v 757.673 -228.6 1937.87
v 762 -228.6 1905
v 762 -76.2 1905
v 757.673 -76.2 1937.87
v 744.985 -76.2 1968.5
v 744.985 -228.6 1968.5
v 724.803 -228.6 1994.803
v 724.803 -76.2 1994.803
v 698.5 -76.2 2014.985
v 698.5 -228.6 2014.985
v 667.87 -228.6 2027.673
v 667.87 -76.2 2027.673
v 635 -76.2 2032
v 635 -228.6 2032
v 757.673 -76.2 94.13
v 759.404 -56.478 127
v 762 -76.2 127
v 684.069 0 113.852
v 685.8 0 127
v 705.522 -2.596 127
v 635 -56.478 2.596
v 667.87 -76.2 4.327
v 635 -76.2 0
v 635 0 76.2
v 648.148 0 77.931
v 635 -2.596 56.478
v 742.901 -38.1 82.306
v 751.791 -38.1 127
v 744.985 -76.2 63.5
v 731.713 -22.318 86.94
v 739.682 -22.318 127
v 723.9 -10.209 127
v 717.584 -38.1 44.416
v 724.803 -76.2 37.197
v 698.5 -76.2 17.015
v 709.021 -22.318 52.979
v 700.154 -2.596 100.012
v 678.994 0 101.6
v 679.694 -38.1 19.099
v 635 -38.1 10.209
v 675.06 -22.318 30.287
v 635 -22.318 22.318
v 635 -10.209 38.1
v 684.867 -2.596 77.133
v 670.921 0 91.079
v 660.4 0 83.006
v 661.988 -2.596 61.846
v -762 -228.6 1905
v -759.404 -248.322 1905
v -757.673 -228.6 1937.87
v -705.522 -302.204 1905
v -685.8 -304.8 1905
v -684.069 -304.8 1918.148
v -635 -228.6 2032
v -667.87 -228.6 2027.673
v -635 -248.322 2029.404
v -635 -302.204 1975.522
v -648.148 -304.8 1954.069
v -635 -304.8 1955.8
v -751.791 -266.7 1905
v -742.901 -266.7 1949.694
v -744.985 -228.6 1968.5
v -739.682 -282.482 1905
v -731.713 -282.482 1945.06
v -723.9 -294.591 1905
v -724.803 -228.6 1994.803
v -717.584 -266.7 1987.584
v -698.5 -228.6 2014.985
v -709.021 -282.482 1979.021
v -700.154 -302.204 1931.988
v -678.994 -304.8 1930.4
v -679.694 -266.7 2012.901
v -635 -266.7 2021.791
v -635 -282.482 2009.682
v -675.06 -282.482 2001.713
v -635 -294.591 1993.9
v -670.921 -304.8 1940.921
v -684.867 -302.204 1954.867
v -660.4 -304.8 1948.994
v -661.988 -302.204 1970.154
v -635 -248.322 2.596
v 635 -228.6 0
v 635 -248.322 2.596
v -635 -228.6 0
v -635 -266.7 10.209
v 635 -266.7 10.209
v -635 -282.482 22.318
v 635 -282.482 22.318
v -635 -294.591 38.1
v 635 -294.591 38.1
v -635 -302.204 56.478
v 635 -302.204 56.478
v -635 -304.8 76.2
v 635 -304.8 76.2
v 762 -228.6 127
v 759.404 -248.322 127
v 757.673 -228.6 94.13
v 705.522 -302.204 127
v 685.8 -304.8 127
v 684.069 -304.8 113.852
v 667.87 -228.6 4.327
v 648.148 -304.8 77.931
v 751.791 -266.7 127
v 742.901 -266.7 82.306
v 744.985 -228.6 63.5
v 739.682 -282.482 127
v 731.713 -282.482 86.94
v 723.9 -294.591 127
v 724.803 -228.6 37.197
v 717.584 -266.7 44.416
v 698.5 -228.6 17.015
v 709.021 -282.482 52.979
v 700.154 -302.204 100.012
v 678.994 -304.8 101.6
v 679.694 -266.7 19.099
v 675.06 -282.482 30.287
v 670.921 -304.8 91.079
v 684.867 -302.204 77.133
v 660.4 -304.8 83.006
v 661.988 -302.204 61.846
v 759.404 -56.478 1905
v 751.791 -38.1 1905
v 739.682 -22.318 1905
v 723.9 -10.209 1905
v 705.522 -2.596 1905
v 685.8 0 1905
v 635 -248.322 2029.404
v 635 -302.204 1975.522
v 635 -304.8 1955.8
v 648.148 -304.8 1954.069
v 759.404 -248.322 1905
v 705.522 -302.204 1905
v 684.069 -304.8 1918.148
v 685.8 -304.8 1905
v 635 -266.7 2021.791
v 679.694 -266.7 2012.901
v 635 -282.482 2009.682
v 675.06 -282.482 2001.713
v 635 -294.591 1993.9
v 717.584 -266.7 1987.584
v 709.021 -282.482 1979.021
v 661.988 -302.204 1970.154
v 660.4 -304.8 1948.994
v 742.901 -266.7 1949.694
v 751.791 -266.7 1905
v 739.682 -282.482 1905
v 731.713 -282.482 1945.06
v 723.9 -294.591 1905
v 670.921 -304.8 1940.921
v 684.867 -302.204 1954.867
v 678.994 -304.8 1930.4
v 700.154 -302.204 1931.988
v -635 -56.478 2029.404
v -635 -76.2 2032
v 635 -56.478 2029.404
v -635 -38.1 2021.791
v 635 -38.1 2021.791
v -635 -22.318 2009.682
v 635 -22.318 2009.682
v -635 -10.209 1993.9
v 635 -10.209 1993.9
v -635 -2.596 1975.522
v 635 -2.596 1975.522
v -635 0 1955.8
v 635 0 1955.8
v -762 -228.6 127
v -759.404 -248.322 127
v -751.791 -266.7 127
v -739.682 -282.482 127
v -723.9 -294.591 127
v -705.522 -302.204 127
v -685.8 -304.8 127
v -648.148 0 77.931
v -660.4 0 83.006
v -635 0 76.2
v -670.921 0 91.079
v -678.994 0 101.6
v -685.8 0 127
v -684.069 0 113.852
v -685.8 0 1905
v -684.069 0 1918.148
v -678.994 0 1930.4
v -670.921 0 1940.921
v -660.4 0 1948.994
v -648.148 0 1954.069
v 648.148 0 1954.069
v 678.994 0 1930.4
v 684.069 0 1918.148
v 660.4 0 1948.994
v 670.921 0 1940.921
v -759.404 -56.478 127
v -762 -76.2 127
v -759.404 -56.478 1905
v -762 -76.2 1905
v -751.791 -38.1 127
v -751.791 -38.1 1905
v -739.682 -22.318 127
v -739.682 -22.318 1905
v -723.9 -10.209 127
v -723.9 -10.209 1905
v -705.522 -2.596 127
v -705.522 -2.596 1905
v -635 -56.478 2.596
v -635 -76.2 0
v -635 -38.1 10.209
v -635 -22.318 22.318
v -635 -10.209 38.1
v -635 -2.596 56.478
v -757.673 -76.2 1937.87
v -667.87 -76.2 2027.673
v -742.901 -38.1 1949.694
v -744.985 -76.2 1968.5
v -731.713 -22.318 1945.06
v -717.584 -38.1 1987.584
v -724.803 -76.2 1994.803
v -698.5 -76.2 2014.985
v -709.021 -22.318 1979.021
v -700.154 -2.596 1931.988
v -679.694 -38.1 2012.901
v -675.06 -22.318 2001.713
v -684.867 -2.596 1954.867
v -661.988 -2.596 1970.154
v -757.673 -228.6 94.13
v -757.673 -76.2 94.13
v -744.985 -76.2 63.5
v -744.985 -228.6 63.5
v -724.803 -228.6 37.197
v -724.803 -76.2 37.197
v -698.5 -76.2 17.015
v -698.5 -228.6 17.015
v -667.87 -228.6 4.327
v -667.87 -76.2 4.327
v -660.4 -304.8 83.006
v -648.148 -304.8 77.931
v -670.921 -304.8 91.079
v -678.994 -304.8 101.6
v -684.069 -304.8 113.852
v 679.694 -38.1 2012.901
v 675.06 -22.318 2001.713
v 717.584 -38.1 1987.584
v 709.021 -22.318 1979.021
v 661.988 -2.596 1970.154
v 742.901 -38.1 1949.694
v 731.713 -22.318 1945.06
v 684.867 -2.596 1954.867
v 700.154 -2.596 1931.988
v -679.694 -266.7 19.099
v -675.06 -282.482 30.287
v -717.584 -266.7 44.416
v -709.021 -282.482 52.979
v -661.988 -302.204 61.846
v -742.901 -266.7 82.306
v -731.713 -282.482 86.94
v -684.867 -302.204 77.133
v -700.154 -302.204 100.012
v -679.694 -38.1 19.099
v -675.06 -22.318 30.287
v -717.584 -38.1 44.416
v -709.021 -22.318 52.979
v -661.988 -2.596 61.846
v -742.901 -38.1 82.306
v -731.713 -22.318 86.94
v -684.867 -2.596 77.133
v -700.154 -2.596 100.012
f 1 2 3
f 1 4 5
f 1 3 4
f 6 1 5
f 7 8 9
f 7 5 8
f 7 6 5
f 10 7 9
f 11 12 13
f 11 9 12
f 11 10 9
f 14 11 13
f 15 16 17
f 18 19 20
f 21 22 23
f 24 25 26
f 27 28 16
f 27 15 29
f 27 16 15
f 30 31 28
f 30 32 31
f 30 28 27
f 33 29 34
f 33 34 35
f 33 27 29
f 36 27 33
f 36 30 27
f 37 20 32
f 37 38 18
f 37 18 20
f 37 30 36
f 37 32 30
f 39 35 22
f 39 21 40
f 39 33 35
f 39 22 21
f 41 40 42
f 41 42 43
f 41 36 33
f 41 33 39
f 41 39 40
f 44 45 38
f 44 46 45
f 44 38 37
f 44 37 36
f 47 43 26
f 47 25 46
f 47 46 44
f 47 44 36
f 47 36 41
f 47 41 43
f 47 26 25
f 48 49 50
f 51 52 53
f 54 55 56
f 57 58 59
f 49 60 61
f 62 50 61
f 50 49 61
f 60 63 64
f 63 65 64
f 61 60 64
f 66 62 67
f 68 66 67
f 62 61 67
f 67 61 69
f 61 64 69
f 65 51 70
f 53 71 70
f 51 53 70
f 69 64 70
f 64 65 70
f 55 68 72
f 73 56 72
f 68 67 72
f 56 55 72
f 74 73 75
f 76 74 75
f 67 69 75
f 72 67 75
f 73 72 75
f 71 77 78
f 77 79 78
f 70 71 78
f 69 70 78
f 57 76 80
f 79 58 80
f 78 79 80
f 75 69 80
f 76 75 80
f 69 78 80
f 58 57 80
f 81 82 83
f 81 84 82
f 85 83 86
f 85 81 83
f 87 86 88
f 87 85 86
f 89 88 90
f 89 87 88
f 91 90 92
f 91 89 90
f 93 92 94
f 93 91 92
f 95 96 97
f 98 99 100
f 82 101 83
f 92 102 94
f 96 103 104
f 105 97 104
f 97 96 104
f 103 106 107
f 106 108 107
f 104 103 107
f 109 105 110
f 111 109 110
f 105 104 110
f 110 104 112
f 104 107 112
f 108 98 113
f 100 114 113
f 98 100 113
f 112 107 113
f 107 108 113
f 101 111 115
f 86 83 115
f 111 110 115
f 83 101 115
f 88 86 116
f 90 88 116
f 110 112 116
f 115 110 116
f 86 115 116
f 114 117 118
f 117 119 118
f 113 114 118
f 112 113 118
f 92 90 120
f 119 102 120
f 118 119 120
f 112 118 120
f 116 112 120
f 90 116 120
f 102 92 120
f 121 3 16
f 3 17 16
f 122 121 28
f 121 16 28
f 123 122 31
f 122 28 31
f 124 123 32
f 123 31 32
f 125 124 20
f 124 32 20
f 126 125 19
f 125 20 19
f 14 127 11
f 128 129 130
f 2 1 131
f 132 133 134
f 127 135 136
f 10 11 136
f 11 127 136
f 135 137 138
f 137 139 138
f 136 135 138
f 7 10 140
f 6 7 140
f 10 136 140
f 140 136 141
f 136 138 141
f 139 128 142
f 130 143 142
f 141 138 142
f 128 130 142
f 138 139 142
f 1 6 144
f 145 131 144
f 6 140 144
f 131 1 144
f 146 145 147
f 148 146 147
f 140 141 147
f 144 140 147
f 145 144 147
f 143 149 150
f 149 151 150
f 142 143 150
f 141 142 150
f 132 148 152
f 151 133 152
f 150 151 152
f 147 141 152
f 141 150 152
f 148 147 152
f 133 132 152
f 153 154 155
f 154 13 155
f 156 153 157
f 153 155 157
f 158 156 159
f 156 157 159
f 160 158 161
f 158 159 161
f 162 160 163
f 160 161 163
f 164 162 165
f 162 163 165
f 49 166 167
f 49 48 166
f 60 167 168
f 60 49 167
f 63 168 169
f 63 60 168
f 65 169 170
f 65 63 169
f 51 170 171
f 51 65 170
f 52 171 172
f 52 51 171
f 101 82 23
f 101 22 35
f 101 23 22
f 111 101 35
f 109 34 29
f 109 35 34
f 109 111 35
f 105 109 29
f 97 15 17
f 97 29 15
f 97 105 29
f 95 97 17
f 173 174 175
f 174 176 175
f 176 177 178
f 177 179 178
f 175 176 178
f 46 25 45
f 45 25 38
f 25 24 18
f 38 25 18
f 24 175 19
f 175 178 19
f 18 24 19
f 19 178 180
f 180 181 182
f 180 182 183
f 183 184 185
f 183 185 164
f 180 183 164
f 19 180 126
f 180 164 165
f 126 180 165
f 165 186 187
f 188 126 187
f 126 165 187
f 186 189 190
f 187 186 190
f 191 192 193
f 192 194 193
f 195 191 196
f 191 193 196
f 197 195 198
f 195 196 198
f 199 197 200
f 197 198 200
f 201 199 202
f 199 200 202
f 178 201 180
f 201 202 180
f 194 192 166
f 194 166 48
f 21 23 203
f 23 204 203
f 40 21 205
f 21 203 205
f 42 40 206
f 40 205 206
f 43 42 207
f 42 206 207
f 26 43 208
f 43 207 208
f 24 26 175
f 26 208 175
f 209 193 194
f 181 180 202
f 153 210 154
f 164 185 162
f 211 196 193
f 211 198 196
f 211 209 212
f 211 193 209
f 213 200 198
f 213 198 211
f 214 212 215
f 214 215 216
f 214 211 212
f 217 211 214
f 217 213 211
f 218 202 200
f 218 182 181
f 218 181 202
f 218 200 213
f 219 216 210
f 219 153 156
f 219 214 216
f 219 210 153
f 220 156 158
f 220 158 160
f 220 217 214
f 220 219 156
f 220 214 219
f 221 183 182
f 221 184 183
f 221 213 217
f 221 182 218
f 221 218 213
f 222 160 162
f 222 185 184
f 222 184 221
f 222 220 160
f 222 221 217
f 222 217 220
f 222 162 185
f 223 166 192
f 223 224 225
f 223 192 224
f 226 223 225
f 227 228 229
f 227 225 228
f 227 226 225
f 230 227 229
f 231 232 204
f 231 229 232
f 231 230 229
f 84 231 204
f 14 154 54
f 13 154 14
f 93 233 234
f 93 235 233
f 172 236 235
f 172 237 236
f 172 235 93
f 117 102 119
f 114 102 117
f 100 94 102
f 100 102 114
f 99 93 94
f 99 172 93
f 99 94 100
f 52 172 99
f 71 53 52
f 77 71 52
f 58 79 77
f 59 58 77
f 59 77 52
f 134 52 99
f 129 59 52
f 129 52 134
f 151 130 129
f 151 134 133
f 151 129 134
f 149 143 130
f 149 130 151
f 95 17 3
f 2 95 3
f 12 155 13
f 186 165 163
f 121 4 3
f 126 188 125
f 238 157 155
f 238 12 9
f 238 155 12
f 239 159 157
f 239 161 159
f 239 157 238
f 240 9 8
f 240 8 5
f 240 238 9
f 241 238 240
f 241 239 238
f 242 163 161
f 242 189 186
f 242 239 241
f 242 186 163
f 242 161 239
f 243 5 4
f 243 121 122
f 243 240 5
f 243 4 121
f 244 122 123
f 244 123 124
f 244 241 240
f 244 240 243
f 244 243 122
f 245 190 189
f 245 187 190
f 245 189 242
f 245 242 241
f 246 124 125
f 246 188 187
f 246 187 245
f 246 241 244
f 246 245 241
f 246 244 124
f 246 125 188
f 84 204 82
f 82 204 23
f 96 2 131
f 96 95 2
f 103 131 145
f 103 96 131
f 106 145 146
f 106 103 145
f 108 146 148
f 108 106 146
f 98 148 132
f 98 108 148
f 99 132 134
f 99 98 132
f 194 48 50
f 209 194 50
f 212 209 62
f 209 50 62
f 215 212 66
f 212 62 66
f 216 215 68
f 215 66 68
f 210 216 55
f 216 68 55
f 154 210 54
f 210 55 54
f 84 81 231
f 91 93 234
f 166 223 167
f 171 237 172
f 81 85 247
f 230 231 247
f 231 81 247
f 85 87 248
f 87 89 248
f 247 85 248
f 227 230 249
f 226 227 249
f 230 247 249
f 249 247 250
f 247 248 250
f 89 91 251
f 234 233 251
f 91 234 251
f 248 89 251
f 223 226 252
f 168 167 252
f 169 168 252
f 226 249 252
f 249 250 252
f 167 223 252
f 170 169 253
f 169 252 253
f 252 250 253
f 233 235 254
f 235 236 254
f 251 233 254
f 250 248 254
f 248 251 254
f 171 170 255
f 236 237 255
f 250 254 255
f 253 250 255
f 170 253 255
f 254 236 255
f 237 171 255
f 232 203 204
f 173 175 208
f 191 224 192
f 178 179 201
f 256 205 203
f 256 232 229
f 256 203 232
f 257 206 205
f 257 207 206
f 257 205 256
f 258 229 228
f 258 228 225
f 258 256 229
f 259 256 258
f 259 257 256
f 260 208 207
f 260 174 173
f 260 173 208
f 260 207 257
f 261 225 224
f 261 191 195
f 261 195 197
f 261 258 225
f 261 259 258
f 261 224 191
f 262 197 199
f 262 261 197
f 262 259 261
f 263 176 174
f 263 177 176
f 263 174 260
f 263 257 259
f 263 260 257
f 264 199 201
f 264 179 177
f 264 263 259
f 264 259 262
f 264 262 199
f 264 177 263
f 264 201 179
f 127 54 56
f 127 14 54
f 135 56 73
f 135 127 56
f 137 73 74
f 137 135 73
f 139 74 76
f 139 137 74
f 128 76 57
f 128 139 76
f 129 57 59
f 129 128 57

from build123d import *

# Parameters (mm, degrees)
F0_W     = 1524
F0_H     = 2032
F1_DEPTH = 304.8
F2_R     = 127
F3_R     = 76.2


with BuildPart() as f1:
    # F0 (on Front) → F1 (new body)
    with BuildSketch(Plane.XZ):
        with Locations((0, 1016)):
            Rectangle(F0_W, F0_H)
    extrude(amount=F1_DEPTH)

    # F2
    f2_edges = [f1.edges().sort_by_distance(p)[0] for p in [
        (762, -152.4, 2032),
        (-762, -152.4, 2032),
        (762, -152.4, 0),
        (-762, -152.4, 0),
    ]]
    fillet(f2_edges, radius=F2_R)

    # F3
    f3_edges = [f1.edges().sort_by_distance(p)[0] for p in [
        (-762, -304.8, 1016),
        (-762, 0, 1016),
    ]]
    fillet(f3_edges, radius=F3_R)


solid = f1.part
